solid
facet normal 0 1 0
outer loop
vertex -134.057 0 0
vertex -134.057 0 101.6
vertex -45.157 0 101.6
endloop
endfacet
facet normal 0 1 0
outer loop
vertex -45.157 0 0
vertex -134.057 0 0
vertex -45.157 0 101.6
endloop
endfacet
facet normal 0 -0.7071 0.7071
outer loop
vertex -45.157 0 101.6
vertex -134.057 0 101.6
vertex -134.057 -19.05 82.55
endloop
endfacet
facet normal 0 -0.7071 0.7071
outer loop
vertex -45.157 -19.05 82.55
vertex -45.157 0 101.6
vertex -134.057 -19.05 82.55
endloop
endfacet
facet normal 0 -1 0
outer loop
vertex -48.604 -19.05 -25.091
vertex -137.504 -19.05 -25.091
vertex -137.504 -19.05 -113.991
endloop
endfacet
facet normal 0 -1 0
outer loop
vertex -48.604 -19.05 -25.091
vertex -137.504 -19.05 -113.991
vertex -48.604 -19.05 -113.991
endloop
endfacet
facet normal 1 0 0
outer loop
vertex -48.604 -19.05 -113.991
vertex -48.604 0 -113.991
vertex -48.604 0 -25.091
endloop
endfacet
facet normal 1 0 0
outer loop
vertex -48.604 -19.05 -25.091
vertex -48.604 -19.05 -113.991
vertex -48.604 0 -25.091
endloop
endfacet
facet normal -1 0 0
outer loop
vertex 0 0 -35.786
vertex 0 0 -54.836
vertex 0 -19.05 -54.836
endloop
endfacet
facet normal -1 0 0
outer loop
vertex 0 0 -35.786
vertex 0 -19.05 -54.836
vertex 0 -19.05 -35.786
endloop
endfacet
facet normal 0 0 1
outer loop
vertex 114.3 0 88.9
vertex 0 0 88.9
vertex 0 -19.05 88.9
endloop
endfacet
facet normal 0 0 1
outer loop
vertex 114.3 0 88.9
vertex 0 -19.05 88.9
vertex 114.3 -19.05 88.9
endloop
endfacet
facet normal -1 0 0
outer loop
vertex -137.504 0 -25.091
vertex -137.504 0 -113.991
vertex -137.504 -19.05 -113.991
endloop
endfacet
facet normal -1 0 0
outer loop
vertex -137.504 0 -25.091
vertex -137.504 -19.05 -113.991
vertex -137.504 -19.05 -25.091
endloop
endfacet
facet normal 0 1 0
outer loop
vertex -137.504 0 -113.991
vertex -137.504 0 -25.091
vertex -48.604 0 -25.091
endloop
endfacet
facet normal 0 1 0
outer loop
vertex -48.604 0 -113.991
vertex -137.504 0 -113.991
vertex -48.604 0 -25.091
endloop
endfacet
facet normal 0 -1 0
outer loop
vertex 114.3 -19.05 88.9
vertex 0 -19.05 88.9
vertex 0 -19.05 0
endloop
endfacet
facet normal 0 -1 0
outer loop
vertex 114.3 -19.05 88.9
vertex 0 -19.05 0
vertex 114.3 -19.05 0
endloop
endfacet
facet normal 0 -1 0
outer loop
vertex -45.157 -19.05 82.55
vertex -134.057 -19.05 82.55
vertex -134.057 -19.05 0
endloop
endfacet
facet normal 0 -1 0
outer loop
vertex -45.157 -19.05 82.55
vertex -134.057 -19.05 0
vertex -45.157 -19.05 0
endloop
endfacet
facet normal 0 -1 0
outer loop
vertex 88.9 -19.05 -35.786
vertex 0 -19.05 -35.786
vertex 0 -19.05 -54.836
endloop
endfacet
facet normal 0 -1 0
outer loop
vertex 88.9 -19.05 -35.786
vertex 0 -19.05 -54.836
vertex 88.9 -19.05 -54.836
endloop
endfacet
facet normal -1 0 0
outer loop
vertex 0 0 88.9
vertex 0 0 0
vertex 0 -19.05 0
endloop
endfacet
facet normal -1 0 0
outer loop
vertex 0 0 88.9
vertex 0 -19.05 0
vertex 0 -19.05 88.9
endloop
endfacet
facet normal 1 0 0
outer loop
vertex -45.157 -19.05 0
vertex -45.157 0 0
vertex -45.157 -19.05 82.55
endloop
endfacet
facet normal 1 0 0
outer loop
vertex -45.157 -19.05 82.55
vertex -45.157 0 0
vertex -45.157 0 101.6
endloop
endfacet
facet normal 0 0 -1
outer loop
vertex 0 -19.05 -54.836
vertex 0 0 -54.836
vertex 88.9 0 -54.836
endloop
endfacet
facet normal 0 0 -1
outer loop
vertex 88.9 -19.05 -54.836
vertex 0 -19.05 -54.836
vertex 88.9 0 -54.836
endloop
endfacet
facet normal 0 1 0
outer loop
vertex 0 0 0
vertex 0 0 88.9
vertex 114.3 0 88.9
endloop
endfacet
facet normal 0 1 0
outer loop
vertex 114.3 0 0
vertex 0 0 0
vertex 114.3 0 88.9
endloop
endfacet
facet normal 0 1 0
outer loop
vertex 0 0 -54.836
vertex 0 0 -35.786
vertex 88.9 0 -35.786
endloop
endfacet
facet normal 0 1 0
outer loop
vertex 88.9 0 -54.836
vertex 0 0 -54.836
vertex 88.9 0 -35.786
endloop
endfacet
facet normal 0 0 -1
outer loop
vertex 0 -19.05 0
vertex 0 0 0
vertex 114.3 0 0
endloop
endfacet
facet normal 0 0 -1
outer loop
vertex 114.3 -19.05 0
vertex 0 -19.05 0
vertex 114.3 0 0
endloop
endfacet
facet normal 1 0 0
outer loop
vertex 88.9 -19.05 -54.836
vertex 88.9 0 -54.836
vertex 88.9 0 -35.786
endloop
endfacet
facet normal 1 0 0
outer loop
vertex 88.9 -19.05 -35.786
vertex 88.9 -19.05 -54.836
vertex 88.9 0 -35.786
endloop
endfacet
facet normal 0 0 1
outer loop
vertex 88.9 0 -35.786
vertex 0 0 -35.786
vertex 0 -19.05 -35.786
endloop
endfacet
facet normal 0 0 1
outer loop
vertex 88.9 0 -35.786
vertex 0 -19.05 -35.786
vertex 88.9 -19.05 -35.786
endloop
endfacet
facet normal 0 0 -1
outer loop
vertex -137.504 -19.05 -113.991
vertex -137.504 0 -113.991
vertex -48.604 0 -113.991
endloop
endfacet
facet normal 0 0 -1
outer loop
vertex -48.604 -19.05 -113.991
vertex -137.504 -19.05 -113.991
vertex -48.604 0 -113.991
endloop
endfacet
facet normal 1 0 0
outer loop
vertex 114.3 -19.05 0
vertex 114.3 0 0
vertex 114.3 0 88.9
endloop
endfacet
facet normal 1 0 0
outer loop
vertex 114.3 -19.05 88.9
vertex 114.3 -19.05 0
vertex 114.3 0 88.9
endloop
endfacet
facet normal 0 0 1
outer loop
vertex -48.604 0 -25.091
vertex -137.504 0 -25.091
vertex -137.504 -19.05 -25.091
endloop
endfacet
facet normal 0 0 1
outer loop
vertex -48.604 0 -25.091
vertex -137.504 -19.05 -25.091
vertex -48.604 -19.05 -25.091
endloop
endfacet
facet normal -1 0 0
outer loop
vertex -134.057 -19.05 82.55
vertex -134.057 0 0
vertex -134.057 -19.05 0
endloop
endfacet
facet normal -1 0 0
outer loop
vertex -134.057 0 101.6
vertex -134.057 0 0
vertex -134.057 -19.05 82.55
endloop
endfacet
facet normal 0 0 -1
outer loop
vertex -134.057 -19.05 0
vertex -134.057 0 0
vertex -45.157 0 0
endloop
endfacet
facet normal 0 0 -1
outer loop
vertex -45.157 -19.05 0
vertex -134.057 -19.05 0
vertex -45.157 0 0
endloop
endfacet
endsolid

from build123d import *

# Parameters (mm, degrees)
F0_W     = 114.3
F0_H     = 88.9
F1_DEPTH = 19.05
F2_W     = 88.9
F2_H     = 19.05
F3_DEPTH = 19.05
F4_W     = 88.9
F4_H     = 101.6
F5_DEPTH = 19.05
F7_DEPTH = 248.3578988337
F8_W     = 88.9
F8_H     = 88.9
F9_DEPTH = 19.05


with BuildPart() as f1:
    # F0 (on Front) → F1 (new body)
    with BuildSketch(Plane.XZ):
        with Locations((57.15, 44.45)):
            Rectangle(F0_W, F0_H)
    extrude(amount=F1_DEPTH)


with BuildPart() as f3:
    # F2 (on Front) → F3 (new body)
    with BuildSketch(Plane.XZ):
        with Locations((44.45, -45.3105017608)):
            Rectangle(F2_W, F2_H)
    extrude(amount=F3_DEPTH)


with BuildPart() as f5:
    # F4 (on Front) → F5 (new body)
    with BuildSketch(Plane.XZ):
        with Locations((-89.6068988337, 50.8)):
            Rectangle(F4_W, F4_H)
    extrude(amount=F5_DEPTH)

    # F6 (on face) → F7 (cut, through all)
    with BuildSketch(Plane(origin=(-134.0568988337, 0, 0), x_dir=(0, -1, 0), z_dir=(-1, 0, 0))):
        Polygon((19.05, 101.6), (0, 101.6), (19.05, 82.55), align=None)
    extrude(amount=-F7_DEPTH, mode=Mode.SUBTRACT)


with BuildPart() as f9:
    # F8 (on Front) → F9 (new body)
    with BuildSketch(Plane.XZ):
        with Locations((-93.0538623974, -69.5413928479)):
            Rectangle(F8_W, F8_H)
    extrude(amount=F9_DEPTH)


solid = Compound([f1.part, f3.part, f5.part, f9.part])
